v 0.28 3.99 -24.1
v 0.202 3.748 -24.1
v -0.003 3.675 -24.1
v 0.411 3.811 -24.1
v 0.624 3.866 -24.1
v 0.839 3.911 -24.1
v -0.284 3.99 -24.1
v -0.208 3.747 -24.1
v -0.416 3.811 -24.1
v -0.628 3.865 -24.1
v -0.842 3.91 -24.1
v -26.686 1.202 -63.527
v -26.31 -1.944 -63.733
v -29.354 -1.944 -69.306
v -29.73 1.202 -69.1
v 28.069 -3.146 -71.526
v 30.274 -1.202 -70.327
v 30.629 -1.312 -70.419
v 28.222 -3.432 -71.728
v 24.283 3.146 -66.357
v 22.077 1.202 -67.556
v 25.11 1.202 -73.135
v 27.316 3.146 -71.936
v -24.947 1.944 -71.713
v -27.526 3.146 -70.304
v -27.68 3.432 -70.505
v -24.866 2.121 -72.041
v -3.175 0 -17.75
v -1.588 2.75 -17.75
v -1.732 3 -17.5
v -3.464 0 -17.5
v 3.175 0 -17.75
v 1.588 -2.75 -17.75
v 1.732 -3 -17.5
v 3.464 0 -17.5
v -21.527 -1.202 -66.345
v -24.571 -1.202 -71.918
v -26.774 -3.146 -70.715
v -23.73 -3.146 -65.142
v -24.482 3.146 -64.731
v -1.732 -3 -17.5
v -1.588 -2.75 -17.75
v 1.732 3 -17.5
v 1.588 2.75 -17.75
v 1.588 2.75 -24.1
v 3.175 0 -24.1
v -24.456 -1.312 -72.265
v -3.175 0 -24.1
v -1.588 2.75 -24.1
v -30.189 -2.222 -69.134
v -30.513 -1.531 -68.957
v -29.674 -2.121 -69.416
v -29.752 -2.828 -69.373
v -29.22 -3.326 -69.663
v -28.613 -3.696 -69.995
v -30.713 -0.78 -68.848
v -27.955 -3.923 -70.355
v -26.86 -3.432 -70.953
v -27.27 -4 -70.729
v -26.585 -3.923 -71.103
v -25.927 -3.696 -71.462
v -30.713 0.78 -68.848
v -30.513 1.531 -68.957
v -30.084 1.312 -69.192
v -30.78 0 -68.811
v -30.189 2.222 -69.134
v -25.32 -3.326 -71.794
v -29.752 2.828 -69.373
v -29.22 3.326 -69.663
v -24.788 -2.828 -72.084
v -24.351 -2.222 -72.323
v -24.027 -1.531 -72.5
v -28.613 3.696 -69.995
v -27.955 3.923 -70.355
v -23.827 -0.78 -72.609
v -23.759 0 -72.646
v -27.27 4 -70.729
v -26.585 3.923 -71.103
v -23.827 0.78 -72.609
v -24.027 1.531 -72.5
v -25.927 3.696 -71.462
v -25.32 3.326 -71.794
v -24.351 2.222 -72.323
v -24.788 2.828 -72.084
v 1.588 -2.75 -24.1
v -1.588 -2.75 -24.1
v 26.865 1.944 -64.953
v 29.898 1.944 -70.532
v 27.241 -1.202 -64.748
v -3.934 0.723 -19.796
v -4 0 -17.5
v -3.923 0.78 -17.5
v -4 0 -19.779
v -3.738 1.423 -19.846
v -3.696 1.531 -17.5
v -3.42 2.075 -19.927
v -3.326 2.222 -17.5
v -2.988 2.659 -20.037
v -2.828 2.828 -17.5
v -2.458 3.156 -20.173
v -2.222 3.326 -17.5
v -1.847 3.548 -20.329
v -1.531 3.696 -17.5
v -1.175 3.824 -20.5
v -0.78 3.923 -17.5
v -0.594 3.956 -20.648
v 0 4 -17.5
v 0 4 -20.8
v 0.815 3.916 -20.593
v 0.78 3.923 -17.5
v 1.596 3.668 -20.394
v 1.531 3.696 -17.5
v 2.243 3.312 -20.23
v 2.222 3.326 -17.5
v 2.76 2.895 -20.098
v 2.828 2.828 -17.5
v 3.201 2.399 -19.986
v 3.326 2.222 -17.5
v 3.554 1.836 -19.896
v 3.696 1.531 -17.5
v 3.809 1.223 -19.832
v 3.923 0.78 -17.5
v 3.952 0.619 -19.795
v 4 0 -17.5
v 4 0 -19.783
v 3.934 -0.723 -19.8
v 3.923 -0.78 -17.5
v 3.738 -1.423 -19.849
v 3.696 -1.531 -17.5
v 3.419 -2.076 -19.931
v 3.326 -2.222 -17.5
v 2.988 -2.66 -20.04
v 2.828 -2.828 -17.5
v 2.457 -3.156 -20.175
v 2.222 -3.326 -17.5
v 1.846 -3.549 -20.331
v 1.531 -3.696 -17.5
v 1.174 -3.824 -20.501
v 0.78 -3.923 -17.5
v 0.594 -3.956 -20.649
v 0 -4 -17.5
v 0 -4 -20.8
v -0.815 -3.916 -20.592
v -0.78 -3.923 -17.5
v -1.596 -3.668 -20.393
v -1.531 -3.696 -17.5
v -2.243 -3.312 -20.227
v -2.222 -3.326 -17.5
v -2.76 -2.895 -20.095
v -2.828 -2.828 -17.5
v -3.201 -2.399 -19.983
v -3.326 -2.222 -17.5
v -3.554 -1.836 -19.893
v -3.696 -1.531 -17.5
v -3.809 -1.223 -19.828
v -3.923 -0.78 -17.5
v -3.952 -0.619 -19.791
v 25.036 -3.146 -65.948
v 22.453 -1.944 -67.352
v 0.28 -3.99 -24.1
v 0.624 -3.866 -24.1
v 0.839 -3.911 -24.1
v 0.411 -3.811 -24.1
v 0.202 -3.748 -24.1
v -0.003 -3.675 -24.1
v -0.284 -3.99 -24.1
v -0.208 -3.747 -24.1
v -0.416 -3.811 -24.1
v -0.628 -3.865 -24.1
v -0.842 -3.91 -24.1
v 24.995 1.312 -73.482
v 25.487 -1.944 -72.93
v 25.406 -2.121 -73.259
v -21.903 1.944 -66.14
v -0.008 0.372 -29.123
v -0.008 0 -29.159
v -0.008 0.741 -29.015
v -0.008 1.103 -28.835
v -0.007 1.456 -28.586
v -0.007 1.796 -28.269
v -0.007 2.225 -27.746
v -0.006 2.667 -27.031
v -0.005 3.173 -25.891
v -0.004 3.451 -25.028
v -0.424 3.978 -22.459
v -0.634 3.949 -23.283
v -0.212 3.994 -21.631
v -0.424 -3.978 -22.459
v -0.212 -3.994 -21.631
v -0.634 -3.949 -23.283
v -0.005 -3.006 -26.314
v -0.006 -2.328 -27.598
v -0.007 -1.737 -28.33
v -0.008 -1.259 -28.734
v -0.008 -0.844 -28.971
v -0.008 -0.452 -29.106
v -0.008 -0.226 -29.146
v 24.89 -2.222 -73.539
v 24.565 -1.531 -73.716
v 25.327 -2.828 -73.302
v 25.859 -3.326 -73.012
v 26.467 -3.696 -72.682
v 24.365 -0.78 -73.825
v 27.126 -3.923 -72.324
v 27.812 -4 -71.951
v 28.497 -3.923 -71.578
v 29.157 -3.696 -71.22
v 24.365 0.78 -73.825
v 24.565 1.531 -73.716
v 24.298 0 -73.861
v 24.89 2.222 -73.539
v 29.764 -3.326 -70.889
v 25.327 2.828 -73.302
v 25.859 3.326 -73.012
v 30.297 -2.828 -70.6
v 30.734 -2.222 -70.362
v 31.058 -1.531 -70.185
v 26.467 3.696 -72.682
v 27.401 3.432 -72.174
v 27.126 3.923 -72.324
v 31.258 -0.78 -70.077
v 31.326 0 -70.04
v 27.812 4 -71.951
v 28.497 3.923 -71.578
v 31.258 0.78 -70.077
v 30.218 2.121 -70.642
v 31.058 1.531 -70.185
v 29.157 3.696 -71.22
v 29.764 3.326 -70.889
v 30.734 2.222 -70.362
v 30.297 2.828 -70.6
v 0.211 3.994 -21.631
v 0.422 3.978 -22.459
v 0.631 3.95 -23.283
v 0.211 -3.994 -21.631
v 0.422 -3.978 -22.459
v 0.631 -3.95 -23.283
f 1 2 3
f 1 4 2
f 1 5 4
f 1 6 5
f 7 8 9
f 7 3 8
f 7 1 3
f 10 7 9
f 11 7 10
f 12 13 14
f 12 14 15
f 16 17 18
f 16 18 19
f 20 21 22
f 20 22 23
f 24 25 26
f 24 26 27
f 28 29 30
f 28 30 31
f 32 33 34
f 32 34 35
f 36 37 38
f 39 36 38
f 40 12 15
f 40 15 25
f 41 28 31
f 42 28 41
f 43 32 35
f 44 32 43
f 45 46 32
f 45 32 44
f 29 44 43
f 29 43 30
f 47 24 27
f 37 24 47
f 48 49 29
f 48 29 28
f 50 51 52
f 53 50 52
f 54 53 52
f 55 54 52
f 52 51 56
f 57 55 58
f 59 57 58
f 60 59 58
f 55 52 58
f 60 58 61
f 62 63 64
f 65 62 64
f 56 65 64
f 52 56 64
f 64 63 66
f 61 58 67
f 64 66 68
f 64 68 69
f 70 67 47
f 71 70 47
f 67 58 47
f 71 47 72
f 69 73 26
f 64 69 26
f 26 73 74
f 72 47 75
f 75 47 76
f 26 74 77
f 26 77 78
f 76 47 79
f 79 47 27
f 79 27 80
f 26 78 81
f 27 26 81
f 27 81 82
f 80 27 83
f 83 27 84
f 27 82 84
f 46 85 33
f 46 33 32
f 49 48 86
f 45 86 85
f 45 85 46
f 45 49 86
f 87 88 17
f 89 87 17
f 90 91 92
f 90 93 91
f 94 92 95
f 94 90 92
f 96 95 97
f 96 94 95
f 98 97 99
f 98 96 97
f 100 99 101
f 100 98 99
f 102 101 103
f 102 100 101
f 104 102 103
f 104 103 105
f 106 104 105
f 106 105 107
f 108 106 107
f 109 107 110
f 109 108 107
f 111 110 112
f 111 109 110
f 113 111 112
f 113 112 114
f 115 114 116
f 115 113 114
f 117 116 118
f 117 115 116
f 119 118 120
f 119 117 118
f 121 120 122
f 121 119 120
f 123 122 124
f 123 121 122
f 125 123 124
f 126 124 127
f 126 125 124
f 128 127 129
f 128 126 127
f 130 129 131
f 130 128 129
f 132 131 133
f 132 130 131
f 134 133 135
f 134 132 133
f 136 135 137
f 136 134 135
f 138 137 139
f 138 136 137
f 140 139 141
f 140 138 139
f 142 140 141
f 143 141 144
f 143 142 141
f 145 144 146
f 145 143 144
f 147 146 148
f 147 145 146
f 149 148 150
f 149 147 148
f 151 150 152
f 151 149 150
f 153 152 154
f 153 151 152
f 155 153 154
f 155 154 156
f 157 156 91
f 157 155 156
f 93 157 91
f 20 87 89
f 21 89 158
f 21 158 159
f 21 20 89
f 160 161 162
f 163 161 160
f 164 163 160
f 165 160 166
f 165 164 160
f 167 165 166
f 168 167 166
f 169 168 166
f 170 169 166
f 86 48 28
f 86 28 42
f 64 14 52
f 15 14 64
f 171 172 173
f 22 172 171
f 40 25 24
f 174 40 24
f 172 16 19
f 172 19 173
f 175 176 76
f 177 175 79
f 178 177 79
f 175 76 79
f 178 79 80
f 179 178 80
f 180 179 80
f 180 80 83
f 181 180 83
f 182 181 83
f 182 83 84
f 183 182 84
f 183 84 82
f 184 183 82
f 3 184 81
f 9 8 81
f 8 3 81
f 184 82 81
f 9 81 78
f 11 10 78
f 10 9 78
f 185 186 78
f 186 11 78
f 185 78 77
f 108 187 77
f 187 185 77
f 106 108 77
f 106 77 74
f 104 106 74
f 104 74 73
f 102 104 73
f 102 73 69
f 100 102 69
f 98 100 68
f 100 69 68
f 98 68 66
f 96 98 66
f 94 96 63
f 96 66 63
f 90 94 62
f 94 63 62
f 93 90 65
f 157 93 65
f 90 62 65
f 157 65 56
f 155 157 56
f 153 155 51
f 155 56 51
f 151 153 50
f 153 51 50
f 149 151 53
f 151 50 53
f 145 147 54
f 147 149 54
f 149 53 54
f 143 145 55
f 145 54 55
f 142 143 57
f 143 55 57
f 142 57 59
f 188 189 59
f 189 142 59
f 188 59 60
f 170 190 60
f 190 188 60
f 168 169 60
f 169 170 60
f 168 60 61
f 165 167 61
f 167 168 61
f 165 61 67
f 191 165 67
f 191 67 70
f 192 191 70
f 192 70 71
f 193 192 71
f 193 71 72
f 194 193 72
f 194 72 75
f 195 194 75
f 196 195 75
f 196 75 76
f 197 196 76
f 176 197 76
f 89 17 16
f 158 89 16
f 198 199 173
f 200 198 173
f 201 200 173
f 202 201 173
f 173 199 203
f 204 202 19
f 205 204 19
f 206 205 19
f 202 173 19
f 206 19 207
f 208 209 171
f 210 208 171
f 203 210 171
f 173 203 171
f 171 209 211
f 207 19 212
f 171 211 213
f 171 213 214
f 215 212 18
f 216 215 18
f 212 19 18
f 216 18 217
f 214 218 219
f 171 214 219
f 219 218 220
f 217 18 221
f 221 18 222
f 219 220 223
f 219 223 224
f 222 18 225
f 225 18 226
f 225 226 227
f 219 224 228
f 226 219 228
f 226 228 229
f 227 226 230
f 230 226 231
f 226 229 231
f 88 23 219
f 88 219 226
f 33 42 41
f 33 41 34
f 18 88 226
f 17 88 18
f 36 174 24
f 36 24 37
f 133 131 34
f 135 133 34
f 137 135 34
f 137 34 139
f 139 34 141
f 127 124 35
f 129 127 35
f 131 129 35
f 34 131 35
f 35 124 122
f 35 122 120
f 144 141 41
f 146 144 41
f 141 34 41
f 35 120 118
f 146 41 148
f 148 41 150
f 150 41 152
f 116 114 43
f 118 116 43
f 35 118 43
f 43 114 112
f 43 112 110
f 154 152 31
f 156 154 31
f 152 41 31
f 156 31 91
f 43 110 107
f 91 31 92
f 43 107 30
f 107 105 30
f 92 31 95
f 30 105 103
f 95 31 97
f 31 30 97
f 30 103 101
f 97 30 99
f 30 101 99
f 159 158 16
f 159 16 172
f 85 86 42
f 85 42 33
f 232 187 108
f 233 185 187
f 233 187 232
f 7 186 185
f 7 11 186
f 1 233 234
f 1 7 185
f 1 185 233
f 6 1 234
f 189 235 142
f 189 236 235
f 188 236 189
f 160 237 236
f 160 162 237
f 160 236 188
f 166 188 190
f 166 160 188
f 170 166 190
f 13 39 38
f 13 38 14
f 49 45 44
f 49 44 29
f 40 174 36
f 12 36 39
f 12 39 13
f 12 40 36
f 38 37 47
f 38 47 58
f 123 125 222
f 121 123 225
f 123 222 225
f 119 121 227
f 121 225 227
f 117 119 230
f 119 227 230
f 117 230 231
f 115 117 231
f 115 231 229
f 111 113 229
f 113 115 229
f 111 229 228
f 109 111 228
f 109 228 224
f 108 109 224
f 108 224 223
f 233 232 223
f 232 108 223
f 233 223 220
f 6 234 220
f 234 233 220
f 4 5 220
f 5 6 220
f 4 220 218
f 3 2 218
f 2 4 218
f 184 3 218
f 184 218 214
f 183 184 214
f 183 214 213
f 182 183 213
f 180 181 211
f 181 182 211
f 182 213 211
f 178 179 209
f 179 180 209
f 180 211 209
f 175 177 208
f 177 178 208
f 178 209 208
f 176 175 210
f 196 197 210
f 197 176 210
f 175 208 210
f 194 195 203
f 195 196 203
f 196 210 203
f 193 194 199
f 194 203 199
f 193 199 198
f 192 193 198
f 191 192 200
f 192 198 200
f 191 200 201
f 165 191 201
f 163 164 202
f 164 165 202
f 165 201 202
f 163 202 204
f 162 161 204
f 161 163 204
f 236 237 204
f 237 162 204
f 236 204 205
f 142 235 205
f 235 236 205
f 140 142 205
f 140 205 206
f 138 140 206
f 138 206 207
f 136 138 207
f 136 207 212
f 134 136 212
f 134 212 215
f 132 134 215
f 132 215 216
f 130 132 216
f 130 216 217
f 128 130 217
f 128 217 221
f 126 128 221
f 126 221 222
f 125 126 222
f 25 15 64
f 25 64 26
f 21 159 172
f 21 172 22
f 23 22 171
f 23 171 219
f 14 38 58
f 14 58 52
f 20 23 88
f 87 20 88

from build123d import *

# Parameters (mm, degrees)
SKETCH1_W           = 4
SKETCH1_H           = 6.6
BOSS_EXTRUDE1_REACH = 63.704
SKETCH21_R          = 4
BOSS_EXTRUDE2_REACH = 77.825
SKETCH22_R          = 4
CUT_EXTRUDE3_DEPTH  = 6.6
CUT_EXTRUDE4_DEPTH  = 6.6
CUT_EXTRUDE5_DEPTH  = 6.6
CHAMFER2_SIZE       = 0.25


with BuildPart() as part:
    # Sketch1 → Revolve-Thin1 (revolve)
    with BuildSketch(Plane(origin=(0, 0, 0), x_dir=(1, 0, 0), z_dir=(0, 1, 0))):
        with Locations((-2, 20.8)):
            Rectangle(SKETCH1_W, SKETCH1_H)
    revolve(axis=Axis((0, 0, -17.5), (0, 0, -1)))

    # Sketch21 → Boss-Extrude1 (add, up to next)
    with BuildSketch(Plane(origin=(-36.020185124, 0, -65.949410445), x_dir=(0.877628145, 0, -0.47934209), z_dir=(0.47934209, 0, 0.877628145)), mode=Mode.PRIVATE) as boss_extrude1_sk1:
        with Locations((9.970315475, 0)):
            Circle(SKETCH21_R)
    boss_extrude1_tool1 = extrude(boss_extrude1_sk1.sketch, amount=BOSS_EXTRUDE1_REACH, mode=Mode.PRIVATE) - part.part
    add(boss_extrude1_tool1.solids().sort_by_distance((-27.269956, 0, -70.728602))[0])

    # Sketch22 → Boss-Extrude2 (add, up to next)
    with BuildSketch(Plane(origin=(36.540728539, 0, -67.204649662), x_dir=(0.878534203, 0, 0.477679446), z_dir=(-0.477679446, 0, 0.878534203)), mode=Mode.PRIVATE) as boss_extrude2_sk1:
        with Locations((-9.935732483, 0)):
            Circle(SKETCH22_R)
    boss_extrude2_tool1 = extrude(boss_extrude2_sk1.sketch, amount=BOSS_EXTRUDE2_REACH, mode=Mode.PRIVATE) - part.part
    add(boss_extrude2_tool1.solids().sort_by_distance((27.811848, 0, -71.950745))[0])

    # Sketch29 → Cut-Extrude3 (cut)
    with BuildSketch(Plane(origin=(-36.020185124, 0, -65.949410445), x_dir=(-0.877628145, 0, 0.47934209), z_dir=(-0.47934209, 0, -0.877628145))):
        Polygon((-7.031266698, 1.20221696), (-9.541941515, 3.146399384), (-12.480990292, 1.944182424), (-12.909364252, -1.20221696), (-10.398689436, -3.146399384), (-7.459640658, -1.944182424), align=None)
    extrude(amount=-CUT_EXTRUDE3_DEPTH, mode=Mode.SUBTRACT)

    # Sketch30 → Cut-Extrude4 (cut)
    with BuildSketch(Plane(origin=(36.540728539, 0, -67.204649662), x_dir=(-0.878534203, 0, -0.477679446), z_dir=(0.477679446, 0, -0.878534203))):
        Polygon((12.87478126, 1.20221696), (10.364106444, 3.146399384), (7.425057666, 1.944182424), (6.996683706, -1.20221696), (9.507358523, -3.146399384), (12.4464073, -1.944182424), align=None)
    extrude(amount=-CUT_EXTRUDE4_DEPTH, mode=Mode.SUBTRACT)

    # Sketch18 → Cut-Extrude5 (cut)
    with BuildSketch(Plane.XY.offset(-17.5)):
        Polygon((1.58771324, 2.75), (-1.58771324, 2.75), (-3.175426481, 0), (-1.58771324, -2.75), (1.58771324, -2.75), (3.175426481, 0), align=None)
    extrude(amount=-CUT_EXTRUDE5_DEPTH, mode=Mode.SUBTRACT)

    # Chamfer2
    chamfer2_edges = [part.edges().sort_by_distance(p)[0] for p in [
        (-29.661371054, -0.370982732, -69.422461356),
        (-28.747628135, 2.174308172, -69.921528578),
        (-26.356212732, 2.545290904, -71.227669527),
        (-24.878540246, 0.370982732, -72.034743254),
        (-25.792283165, -2.174308172, -71.535676032),
        (-28.183698569, -2.545290904, -70.229535082),
        (25.417963429, -0.370982732, -73.252355328),
        (26.332649691, 2.174308172, -72.755019168),
        (28.726533979, 2.545290904, -71.453408693),
        (30.205732005, 0.370982732, -70.649134379),
        (29.291045743, -2.174308172, -71.146470539),
        (26.897161455, -2.545290904, -72.448081013),
        (2.38156986, 1.375, -17.5),
        (0, 2.75, -17.5),
        (-2.38156986, 1.375, -17.5),
        (-2.38156986, -1.375, -17.5),
        (0, -2.75, -17.5),
        (2.38156986, -1.375, -17.5),
    ]]
    chamfer(chamfer2_edges, length=CHAMFER2_SIZE)


solid = part.part
